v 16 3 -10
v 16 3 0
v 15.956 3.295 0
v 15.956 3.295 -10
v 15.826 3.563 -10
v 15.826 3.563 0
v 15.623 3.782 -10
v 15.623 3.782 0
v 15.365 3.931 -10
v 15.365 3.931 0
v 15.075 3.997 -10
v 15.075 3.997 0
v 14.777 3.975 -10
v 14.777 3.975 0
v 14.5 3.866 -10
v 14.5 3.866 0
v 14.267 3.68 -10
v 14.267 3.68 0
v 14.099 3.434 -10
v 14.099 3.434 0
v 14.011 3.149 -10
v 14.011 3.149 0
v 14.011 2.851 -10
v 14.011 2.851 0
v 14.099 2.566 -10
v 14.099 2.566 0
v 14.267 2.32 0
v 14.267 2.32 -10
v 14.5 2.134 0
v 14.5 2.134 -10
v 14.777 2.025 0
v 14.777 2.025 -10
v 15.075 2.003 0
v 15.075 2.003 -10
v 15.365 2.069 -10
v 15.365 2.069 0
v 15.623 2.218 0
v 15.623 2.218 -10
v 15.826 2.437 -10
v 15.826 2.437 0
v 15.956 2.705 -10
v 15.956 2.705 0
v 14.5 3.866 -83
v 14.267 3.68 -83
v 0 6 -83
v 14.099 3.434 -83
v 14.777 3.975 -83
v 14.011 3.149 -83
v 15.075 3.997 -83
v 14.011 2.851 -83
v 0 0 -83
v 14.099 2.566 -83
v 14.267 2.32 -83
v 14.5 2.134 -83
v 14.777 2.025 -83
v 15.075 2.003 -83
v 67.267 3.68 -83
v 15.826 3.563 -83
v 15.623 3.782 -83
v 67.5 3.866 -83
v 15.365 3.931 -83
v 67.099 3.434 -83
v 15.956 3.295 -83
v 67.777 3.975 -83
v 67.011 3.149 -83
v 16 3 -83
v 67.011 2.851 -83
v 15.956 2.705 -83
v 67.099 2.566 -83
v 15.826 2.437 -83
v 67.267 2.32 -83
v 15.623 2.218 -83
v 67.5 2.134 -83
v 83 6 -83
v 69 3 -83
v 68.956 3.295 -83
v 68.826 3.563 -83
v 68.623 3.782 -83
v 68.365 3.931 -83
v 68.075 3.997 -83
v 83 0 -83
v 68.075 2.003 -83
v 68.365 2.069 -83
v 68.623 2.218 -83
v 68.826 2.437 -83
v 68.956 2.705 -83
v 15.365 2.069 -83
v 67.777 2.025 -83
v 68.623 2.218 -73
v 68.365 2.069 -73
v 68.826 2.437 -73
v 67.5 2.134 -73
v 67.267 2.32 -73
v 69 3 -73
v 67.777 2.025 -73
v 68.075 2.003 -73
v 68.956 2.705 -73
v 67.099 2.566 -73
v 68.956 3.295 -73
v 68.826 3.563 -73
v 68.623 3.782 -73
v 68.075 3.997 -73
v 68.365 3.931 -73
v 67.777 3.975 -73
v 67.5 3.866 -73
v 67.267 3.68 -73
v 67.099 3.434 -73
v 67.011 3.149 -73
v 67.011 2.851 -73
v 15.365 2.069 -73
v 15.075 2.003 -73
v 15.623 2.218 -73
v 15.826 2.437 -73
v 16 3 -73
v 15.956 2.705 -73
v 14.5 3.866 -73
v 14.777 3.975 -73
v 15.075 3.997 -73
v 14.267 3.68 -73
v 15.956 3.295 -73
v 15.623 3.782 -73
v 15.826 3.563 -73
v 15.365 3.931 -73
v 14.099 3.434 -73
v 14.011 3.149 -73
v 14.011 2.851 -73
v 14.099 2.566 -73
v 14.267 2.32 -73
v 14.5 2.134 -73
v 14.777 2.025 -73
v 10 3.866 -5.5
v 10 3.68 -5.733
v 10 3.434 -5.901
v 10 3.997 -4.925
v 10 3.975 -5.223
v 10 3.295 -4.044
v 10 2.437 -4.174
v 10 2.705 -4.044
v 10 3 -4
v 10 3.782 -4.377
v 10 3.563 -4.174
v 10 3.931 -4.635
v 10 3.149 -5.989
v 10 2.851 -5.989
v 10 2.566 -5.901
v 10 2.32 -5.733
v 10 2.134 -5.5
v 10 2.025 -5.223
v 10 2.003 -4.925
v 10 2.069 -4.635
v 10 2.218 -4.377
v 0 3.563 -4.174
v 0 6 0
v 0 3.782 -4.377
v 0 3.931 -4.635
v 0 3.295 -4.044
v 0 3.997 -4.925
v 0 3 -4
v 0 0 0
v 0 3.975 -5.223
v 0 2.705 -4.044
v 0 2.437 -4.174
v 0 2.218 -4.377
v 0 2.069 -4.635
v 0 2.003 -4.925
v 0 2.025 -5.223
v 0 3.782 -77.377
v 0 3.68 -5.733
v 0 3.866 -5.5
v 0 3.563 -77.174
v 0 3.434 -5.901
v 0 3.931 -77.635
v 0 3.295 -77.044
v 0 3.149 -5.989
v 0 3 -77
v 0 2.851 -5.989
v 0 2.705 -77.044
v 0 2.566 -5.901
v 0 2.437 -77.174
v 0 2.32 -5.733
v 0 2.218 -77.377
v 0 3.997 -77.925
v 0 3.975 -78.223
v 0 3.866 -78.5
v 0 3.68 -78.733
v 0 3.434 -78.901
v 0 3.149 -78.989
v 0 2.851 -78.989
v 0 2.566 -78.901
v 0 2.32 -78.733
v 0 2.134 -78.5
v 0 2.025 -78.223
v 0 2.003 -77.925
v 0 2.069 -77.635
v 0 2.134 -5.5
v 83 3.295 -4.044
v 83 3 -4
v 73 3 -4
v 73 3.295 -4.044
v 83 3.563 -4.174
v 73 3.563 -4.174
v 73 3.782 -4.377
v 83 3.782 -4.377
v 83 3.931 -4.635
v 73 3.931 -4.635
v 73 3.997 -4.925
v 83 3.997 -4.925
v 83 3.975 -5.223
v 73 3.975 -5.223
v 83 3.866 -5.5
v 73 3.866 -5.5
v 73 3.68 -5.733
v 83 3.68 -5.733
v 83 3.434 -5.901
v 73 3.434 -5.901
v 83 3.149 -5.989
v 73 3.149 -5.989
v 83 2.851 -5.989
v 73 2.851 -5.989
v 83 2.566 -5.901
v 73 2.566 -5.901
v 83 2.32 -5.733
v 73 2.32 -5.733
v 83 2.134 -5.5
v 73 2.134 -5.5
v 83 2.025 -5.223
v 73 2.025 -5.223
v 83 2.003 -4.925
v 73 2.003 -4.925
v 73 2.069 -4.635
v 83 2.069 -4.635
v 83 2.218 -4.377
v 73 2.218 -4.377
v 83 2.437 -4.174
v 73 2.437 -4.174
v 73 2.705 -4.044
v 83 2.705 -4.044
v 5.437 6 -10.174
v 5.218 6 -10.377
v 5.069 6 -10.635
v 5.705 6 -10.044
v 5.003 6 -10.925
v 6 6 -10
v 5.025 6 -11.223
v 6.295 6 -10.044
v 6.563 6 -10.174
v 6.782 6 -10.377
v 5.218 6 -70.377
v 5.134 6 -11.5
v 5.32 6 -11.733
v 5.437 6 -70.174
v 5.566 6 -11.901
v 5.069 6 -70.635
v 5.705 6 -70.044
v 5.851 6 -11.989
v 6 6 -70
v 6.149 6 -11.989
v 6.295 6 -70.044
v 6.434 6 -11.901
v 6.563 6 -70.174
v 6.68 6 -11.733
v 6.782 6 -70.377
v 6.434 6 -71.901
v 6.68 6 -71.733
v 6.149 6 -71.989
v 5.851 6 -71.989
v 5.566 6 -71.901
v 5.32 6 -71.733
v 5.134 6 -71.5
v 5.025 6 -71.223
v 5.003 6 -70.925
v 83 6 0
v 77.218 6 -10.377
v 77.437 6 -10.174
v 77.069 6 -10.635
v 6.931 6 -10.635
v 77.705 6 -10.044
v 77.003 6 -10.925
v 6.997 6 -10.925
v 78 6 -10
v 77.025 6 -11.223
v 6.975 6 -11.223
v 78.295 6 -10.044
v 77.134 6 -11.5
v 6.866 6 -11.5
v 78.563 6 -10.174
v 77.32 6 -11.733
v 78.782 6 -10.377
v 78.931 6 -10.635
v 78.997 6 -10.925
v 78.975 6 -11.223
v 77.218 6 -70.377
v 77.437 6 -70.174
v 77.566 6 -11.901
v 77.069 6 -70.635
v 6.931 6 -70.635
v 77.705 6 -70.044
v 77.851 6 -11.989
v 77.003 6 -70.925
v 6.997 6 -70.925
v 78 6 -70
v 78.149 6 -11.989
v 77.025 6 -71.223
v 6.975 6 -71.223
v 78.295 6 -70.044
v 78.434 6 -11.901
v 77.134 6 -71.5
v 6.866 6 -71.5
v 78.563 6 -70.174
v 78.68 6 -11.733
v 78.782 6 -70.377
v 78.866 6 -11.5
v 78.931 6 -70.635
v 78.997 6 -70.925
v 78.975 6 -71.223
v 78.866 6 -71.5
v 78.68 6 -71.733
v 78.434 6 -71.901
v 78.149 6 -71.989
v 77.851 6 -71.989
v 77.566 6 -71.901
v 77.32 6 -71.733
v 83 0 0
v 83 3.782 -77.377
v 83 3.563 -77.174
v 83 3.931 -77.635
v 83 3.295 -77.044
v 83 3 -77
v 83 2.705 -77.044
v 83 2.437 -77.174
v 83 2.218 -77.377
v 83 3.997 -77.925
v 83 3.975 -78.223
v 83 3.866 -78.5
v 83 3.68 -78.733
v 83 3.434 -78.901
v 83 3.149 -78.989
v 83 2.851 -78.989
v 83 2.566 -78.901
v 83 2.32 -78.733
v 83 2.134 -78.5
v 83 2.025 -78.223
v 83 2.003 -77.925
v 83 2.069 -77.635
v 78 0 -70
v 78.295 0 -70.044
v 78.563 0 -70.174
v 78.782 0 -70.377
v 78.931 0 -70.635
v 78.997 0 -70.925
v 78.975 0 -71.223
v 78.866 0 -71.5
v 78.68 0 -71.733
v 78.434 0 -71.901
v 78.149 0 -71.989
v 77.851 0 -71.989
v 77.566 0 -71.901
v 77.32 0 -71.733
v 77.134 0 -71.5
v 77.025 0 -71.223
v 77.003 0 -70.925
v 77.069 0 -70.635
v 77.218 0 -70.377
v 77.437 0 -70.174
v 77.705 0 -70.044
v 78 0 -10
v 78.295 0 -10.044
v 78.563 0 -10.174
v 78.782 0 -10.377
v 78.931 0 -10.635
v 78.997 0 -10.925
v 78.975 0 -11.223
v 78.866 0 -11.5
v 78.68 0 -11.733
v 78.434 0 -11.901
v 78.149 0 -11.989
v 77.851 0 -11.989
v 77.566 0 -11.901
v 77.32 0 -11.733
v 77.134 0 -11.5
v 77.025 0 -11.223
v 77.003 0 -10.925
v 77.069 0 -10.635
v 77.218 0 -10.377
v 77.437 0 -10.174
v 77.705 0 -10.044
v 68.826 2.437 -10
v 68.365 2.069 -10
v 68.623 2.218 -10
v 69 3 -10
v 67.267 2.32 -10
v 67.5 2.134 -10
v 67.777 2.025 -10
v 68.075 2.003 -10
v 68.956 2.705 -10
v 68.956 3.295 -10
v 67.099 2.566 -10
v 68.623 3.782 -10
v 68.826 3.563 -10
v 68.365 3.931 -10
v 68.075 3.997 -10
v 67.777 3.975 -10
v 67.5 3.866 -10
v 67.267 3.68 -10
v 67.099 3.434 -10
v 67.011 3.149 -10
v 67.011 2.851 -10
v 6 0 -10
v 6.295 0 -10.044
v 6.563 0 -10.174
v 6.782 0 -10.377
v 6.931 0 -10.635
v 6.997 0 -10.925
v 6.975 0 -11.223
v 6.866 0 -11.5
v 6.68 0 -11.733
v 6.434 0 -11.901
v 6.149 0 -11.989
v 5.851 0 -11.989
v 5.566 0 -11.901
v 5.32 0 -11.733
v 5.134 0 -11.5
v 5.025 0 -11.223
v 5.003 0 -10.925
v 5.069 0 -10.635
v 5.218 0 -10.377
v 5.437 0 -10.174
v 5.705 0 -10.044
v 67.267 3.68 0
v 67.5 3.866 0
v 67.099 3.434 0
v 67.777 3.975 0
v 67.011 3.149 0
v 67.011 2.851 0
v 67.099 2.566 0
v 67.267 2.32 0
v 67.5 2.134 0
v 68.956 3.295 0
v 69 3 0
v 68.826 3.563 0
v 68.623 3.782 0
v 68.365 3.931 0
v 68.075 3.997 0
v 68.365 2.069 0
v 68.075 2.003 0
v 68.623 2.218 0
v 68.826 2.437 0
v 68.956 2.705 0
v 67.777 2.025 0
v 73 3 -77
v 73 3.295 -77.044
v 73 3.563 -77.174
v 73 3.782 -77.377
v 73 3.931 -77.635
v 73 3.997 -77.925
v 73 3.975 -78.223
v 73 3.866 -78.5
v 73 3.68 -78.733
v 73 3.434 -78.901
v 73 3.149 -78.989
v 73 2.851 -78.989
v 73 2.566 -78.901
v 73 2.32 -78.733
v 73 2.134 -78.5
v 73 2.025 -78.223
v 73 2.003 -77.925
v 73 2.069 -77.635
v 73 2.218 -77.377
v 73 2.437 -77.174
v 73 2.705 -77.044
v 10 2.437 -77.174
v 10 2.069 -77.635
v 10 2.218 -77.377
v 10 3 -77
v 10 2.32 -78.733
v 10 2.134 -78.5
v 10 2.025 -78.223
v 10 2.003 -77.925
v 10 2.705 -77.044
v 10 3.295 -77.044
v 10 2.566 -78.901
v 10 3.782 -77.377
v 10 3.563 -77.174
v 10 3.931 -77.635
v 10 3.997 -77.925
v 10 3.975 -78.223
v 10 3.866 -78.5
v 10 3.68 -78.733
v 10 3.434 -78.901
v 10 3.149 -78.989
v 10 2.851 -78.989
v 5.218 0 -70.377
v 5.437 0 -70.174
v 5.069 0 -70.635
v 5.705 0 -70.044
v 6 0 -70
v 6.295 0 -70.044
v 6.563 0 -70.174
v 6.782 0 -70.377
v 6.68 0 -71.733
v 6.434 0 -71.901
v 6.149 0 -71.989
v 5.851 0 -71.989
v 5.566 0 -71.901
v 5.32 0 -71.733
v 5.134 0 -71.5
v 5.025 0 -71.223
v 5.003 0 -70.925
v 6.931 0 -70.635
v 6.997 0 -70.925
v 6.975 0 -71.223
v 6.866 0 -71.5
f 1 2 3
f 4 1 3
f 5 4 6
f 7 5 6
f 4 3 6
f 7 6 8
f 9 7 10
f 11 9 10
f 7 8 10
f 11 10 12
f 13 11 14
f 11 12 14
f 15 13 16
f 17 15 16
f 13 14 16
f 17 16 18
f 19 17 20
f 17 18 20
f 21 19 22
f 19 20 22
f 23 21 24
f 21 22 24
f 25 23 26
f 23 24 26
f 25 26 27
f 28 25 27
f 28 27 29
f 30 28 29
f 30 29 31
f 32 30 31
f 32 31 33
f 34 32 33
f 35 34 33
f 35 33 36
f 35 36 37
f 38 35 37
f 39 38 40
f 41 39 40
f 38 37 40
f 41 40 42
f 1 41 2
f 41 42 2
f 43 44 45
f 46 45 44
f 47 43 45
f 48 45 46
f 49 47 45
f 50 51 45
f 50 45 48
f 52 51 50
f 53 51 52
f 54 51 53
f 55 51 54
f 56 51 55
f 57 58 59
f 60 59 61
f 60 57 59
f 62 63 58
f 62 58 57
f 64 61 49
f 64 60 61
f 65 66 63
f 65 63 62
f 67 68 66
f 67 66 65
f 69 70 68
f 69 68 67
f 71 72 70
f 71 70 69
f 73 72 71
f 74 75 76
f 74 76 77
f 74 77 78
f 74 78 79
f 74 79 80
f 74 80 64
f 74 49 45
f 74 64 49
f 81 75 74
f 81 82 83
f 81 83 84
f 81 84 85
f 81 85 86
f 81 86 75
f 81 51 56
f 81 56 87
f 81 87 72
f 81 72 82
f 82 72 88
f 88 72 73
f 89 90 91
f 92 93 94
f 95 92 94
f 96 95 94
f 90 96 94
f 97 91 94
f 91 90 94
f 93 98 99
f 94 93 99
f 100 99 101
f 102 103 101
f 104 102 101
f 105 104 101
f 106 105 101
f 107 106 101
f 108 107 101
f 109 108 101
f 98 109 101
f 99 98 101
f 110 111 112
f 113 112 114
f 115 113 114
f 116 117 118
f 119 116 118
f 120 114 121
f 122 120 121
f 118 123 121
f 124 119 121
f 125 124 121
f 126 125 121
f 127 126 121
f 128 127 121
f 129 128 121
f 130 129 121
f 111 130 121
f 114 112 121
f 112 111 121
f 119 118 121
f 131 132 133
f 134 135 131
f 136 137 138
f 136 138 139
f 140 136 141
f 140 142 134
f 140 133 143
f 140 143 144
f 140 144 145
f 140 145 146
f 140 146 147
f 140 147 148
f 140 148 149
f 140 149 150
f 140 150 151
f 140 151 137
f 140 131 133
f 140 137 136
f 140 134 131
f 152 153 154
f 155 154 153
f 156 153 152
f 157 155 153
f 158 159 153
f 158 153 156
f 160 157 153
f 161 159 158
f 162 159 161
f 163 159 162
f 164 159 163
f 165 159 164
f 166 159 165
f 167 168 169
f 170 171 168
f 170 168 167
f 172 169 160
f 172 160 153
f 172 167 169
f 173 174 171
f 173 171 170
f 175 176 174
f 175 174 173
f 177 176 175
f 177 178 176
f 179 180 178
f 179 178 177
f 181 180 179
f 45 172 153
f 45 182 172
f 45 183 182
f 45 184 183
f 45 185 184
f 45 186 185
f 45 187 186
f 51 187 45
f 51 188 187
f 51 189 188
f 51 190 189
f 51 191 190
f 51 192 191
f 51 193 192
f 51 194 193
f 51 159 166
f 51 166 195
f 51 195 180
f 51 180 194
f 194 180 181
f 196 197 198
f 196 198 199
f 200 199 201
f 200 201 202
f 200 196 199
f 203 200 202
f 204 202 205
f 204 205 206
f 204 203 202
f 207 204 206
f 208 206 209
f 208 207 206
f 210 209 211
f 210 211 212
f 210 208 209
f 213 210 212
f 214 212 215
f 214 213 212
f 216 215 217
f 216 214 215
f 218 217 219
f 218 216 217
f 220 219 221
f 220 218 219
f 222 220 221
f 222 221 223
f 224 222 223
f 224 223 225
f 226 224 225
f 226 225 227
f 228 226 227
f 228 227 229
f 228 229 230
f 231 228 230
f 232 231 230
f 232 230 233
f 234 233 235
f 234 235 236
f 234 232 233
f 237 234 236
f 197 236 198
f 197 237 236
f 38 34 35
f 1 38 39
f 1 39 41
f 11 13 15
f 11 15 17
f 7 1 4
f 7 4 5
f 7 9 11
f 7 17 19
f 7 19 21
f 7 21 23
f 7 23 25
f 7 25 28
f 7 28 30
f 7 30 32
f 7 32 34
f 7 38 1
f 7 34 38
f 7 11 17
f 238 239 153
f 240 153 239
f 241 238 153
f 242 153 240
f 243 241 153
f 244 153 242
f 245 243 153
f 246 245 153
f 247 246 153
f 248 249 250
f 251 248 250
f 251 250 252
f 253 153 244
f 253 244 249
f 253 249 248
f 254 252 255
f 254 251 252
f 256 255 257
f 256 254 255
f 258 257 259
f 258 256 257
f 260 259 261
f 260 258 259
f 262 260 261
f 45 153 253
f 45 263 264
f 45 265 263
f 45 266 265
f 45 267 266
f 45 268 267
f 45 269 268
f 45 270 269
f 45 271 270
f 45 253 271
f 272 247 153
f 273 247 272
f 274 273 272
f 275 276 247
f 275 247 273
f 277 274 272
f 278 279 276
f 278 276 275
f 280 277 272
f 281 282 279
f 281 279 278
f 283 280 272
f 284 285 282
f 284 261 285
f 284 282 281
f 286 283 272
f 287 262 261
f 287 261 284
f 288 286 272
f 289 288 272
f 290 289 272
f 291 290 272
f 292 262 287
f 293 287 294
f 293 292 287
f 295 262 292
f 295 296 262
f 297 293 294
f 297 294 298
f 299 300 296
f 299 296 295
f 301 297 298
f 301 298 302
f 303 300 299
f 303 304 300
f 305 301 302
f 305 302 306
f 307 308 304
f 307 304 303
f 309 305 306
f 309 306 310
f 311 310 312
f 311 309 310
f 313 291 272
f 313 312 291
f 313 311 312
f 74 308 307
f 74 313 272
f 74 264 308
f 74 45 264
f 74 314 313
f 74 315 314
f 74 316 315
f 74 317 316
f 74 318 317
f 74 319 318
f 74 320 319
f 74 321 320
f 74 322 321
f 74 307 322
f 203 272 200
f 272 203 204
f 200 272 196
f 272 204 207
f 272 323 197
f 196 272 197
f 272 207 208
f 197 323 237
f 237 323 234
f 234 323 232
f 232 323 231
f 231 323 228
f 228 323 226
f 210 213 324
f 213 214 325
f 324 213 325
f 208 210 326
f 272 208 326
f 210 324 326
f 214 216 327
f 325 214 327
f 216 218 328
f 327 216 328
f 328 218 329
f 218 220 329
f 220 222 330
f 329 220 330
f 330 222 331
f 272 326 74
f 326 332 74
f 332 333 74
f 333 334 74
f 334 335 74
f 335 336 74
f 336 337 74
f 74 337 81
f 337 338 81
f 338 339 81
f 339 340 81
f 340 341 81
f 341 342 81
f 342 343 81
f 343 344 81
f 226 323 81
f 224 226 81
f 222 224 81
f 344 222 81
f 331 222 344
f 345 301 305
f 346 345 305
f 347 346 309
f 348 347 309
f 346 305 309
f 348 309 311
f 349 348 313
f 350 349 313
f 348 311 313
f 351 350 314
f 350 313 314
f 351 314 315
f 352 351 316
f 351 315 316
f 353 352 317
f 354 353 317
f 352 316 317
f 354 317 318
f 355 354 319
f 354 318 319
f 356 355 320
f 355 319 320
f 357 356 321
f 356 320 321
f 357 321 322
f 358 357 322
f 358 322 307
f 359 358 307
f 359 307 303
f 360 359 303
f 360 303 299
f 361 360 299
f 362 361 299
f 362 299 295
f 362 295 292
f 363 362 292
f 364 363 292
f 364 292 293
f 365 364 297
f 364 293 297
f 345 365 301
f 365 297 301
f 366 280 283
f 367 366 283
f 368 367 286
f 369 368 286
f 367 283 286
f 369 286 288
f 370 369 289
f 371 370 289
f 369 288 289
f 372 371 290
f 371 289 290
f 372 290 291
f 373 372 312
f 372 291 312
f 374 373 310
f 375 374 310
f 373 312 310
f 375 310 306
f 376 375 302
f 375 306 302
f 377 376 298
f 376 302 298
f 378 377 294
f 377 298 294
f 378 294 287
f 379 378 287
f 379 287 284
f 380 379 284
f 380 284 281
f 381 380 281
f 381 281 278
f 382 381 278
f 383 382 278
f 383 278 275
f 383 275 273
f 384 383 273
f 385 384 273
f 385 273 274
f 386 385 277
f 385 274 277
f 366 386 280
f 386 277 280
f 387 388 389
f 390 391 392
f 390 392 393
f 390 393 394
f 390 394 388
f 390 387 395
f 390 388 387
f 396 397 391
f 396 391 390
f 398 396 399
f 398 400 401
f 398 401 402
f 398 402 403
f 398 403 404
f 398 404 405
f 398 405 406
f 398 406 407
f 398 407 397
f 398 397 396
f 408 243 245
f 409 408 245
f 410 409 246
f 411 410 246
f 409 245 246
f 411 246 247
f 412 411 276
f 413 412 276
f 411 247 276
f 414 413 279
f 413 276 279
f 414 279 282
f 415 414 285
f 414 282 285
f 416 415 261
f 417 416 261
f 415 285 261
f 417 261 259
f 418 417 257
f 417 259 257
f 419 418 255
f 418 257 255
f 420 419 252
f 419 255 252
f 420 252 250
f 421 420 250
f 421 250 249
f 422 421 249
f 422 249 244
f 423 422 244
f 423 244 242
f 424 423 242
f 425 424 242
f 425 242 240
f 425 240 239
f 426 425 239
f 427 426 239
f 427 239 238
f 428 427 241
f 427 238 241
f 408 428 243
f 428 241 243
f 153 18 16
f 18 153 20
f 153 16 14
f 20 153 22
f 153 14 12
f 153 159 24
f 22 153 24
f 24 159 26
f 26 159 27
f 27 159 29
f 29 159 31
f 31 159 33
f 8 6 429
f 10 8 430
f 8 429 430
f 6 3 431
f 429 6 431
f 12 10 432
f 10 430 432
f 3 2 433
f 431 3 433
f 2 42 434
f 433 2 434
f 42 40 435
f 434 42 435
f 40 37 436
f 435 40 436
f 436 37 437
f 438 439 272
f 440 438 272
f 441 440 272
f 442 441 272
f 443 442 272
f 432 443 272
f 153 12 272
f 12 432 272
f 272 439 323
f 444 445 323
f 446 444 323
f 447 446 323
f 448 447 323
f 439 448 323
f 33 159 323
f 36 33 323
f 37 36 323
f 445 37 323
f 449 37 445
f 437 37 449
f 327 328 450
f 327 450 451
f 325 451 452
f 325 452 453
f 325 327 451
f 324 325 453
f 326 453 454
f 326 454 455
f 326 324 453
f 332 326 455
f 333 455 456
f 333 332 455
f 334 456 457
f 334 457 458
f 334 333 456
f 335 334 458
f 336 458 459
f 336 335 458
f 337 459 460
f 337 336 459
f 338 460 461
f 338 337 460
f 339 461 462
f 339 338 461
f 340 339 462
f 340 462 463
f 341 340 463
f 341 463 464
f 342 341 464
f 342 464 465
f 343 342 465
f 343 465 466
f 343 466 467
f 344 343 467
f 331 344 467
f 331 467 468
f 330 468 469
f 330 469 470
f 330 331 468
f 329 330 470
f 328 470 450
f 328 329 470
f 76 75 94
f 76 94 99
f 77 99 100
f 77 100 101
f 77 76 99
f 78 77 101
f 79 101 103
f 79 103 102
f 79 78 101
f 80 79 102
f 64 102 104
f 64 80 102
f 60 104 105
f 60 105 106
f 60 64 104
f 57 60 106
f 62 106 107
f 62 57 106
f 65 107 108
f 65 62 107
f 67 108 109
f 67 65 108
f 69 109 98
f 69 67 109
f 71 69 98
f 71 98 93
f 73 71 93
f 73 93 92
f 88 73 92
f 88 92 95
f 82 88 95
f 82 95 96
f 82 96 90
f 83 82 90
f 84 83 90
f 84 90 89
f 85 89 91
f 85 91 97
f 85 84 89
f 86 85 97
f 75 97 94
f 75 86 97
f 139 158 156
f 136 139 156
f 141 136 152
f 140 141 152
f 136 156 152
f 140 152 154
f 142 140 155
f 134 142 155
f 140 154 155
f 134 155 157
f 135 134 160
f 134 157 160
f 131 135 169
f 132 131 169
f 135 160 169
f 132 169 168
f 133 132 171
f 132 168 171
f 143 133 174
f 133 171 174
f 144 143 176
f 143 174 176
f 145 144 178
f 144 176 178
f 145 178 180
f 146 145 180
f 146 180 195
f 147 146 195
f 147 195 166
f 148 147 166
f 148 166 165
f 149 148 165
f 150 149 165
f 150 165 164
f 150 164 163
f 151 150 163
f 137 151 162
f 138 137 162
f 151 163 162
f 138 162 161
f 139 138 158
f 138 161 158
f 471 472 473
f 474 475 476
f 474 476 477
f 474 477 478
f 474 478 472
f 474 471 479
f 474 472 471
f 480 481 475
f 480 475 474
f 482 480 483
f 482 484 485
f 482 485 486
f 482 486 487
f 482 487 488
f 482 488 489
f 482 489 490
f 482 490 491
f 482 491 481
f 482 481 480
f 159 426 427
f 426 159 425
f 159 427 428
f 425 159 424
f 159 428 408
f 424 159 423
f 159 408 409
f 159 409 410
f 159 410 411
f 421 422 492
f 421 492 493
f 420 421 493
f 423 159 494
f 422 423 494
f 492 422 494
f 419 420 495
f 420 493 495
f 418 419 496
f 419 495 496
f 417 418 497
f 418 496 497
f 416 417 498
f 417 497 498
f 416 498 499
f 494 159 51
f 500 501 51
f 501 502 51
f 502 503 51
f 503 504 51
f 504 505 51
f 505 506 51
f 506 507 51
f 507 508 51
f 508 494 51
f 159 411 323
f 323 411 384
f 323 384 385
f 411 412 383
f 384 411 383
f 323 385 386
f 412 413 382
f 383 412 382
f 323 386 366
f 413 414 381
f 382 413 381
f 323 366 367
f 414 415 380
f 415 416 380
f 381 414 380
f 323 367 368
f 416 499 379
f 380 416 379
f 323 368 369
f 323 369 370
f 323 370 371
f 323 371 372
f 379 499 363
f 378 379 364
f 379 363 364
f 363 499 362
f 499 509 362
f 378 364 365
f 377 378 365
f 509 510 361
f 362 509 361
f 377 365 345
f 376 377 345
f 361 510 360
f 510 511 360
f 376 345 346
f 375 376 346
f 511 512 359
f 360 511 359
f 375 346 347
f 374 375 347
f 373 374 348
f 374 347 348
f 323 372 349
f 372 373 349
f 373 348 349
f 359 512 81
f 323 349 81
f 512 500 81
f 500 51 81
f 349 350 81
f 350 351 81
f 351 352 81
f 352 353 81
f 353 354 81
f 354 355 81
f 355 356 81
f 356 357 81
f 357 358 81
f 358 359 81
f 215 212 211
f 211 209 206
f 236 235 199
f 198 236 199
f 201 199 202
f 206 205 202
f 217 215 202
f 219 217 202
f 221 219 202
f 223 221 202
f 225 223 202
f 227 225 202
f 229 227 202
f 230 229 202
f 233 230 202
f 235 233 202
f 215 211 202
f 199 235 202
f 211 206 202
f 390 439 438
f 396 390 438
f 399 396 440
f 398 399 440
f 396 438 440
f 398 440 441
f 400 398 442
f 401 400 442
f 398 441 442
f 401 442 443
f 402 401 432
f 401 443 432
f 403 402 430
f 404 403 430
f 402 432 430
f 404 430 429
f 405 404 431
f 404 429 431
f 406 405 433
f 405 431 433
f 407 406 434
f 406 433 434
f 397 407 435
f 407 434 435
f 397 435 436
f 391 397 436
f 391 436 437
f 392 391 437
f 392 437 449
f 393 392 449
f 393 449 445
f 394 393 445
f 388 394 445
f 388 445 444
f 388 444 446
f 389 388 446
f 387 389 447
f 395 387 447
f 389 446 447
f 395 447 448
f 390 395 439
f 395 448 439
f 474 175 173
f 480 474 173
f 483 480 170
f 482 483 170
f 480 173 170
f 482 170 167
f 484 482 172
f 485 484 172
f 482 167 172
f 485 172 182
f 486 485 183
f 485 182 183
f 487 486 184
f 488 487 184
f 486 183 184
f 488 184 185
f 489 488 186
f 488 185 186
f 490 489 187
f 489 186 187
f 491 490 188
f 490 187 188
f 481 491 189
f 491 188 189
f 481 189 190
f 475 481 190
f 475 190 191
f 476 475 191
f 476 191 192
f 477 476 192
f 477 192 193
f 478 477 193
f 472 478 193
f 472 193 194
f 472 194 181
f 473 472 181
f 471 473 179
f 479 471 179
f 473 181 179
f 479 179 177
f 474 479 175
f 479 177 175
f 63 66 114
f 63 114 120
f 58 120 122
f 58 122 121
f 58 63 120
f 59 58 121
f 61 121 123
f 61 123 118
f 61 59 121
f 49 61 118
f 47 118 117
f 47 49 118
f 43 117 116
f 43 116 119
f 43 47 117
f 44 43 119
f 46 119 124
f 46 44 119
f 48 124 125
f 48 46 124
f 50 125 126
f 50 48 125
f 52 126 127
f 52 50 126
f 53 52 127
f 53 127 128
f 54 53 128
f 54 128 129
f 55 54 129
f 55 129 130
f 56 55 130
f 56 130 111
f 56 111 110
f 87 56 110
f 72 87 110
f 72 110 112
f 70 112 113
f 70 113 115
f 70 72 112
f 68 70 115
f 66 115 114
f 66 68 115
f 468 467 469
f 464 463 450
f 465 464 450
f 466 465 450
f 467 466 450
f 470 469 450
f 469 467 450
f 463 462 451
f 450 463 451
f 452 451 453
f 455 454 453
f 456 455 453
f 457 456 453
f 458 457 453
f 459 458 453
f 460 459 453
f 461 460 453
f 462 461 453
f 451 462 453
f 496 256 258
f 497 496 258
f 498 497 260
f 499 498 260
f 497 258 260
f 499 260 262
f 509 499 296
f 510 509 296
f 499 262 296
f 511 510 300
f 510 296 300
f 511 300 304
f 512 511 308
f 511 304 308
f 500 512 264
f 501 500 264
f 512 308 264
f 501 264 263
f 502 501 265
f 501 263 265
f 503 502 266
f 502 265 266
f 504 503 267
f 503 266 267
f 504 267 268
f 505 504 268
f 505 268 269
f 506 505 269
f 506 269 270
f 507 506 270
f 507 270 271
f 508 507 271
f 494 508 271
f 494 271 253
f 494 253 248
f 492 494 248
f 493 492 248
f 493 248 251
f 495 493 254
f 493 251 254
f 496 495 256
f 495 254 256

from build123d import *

# Parameters (mm, degrees)
SKETCH1_W            = 83
SKETCH1_H            = 83
BOSS_EXTRUDE1_DEPTH  = 6
SKETCH2_R            = 1
CUT_EXTRUDE1_DEPTH   = 6
LPATTERN1_COUNT      = 2
LPATTERN1_PITCH      = 72
LPATTERN1_COUNT_DIR2 = 2
LPATTERN1_PITCH_DIR2 = 60
SKETCH3_R            = 1
CUT_EXTRUDE2_DEPTH   = 10
SKETCH4_R            = 1
CUT_EXTRUDE3_DEPTH   = 10


with BuildPart() as part:
    # Sketch1 → Boss-Extrude1 (new body)
    with BuildSketch(Plane(origin=(0, 0, 0), x_dir=(1, 0, 0), z_dir=(0, 1, 0))):
        with Locations((41.5, 41.5)):
            Rectangle(SKETCH1_W, SKETCH1_H)
    extrude(amount=BOSS_EXTRUDE1_DEPTH)

    # Sketch2 → Cut-Extrude1 (cut)
    with BuildSketch(Plane(origin=(0, 6, 0), x_dir=(1, 0, 0), z_dir=(0, 1, 0))):
        with Locations(Location((6, 71, 0), (0, 0, 270))):
            Circle(SKETCH2_R)
    cut_extrude1 = extrude(amount=-CUT_EXTRUDE1_DEPTH, mode=Mode.SUBTRACT)

    # LPattern1: Cut-Extrude1 2 × 2
    with Locations(*[(i * LPATTERN1_PITCH, 0, j * LPATTERN1_PITCH_DIR2) for i in range(LPATTERN1_COUNT) for j in range(LPATTERN1_COUNT_DIR2) if (i, j) != (0, 0)]):
        add(cut_extrude1, mode=Mode.SUBTRACT)

    # Sketch3 → Cut-Extrude2 (cut)
    with BuildSketch(Plane.ZY):
        with Locations((-78, 3)):
            Circle(SKETCH3_R)
        with Locations((-5, 3)):
            Circle(SKETCH3_R)
    cut_extrude2 = extrude(amount=-CUT_EXTRUDE2_DEPTH, mode=Mode.SUBTRACT)

    # Mirror1: Cut-Extrude2 across plane
    add(cut_extrude2.mirror(Plane.ZY.offset(-41.5)), mode=Mode.SUBTRACT)

    # Sketch4 → Cut-Extrude3 (cut)
    with BuildSketch(Plane.XY):
        with Locations((15, 3)):
            Circle(SKETCH4_R)
        with Locations((68, 3)):
            Circle(SKETCH4_R)
    cut_extrude3 = extrude(amount=-CUT_EXTRUDE3_DEPTH, mode=Mode.SUBTRACT)

    # Mirror2: Cut-Extrude3 across plane
    add(cut_extrude3.mirror(Plane.XY.offset(-41.5)), mode=Mode.SUBTRACT)


solid = part.part
